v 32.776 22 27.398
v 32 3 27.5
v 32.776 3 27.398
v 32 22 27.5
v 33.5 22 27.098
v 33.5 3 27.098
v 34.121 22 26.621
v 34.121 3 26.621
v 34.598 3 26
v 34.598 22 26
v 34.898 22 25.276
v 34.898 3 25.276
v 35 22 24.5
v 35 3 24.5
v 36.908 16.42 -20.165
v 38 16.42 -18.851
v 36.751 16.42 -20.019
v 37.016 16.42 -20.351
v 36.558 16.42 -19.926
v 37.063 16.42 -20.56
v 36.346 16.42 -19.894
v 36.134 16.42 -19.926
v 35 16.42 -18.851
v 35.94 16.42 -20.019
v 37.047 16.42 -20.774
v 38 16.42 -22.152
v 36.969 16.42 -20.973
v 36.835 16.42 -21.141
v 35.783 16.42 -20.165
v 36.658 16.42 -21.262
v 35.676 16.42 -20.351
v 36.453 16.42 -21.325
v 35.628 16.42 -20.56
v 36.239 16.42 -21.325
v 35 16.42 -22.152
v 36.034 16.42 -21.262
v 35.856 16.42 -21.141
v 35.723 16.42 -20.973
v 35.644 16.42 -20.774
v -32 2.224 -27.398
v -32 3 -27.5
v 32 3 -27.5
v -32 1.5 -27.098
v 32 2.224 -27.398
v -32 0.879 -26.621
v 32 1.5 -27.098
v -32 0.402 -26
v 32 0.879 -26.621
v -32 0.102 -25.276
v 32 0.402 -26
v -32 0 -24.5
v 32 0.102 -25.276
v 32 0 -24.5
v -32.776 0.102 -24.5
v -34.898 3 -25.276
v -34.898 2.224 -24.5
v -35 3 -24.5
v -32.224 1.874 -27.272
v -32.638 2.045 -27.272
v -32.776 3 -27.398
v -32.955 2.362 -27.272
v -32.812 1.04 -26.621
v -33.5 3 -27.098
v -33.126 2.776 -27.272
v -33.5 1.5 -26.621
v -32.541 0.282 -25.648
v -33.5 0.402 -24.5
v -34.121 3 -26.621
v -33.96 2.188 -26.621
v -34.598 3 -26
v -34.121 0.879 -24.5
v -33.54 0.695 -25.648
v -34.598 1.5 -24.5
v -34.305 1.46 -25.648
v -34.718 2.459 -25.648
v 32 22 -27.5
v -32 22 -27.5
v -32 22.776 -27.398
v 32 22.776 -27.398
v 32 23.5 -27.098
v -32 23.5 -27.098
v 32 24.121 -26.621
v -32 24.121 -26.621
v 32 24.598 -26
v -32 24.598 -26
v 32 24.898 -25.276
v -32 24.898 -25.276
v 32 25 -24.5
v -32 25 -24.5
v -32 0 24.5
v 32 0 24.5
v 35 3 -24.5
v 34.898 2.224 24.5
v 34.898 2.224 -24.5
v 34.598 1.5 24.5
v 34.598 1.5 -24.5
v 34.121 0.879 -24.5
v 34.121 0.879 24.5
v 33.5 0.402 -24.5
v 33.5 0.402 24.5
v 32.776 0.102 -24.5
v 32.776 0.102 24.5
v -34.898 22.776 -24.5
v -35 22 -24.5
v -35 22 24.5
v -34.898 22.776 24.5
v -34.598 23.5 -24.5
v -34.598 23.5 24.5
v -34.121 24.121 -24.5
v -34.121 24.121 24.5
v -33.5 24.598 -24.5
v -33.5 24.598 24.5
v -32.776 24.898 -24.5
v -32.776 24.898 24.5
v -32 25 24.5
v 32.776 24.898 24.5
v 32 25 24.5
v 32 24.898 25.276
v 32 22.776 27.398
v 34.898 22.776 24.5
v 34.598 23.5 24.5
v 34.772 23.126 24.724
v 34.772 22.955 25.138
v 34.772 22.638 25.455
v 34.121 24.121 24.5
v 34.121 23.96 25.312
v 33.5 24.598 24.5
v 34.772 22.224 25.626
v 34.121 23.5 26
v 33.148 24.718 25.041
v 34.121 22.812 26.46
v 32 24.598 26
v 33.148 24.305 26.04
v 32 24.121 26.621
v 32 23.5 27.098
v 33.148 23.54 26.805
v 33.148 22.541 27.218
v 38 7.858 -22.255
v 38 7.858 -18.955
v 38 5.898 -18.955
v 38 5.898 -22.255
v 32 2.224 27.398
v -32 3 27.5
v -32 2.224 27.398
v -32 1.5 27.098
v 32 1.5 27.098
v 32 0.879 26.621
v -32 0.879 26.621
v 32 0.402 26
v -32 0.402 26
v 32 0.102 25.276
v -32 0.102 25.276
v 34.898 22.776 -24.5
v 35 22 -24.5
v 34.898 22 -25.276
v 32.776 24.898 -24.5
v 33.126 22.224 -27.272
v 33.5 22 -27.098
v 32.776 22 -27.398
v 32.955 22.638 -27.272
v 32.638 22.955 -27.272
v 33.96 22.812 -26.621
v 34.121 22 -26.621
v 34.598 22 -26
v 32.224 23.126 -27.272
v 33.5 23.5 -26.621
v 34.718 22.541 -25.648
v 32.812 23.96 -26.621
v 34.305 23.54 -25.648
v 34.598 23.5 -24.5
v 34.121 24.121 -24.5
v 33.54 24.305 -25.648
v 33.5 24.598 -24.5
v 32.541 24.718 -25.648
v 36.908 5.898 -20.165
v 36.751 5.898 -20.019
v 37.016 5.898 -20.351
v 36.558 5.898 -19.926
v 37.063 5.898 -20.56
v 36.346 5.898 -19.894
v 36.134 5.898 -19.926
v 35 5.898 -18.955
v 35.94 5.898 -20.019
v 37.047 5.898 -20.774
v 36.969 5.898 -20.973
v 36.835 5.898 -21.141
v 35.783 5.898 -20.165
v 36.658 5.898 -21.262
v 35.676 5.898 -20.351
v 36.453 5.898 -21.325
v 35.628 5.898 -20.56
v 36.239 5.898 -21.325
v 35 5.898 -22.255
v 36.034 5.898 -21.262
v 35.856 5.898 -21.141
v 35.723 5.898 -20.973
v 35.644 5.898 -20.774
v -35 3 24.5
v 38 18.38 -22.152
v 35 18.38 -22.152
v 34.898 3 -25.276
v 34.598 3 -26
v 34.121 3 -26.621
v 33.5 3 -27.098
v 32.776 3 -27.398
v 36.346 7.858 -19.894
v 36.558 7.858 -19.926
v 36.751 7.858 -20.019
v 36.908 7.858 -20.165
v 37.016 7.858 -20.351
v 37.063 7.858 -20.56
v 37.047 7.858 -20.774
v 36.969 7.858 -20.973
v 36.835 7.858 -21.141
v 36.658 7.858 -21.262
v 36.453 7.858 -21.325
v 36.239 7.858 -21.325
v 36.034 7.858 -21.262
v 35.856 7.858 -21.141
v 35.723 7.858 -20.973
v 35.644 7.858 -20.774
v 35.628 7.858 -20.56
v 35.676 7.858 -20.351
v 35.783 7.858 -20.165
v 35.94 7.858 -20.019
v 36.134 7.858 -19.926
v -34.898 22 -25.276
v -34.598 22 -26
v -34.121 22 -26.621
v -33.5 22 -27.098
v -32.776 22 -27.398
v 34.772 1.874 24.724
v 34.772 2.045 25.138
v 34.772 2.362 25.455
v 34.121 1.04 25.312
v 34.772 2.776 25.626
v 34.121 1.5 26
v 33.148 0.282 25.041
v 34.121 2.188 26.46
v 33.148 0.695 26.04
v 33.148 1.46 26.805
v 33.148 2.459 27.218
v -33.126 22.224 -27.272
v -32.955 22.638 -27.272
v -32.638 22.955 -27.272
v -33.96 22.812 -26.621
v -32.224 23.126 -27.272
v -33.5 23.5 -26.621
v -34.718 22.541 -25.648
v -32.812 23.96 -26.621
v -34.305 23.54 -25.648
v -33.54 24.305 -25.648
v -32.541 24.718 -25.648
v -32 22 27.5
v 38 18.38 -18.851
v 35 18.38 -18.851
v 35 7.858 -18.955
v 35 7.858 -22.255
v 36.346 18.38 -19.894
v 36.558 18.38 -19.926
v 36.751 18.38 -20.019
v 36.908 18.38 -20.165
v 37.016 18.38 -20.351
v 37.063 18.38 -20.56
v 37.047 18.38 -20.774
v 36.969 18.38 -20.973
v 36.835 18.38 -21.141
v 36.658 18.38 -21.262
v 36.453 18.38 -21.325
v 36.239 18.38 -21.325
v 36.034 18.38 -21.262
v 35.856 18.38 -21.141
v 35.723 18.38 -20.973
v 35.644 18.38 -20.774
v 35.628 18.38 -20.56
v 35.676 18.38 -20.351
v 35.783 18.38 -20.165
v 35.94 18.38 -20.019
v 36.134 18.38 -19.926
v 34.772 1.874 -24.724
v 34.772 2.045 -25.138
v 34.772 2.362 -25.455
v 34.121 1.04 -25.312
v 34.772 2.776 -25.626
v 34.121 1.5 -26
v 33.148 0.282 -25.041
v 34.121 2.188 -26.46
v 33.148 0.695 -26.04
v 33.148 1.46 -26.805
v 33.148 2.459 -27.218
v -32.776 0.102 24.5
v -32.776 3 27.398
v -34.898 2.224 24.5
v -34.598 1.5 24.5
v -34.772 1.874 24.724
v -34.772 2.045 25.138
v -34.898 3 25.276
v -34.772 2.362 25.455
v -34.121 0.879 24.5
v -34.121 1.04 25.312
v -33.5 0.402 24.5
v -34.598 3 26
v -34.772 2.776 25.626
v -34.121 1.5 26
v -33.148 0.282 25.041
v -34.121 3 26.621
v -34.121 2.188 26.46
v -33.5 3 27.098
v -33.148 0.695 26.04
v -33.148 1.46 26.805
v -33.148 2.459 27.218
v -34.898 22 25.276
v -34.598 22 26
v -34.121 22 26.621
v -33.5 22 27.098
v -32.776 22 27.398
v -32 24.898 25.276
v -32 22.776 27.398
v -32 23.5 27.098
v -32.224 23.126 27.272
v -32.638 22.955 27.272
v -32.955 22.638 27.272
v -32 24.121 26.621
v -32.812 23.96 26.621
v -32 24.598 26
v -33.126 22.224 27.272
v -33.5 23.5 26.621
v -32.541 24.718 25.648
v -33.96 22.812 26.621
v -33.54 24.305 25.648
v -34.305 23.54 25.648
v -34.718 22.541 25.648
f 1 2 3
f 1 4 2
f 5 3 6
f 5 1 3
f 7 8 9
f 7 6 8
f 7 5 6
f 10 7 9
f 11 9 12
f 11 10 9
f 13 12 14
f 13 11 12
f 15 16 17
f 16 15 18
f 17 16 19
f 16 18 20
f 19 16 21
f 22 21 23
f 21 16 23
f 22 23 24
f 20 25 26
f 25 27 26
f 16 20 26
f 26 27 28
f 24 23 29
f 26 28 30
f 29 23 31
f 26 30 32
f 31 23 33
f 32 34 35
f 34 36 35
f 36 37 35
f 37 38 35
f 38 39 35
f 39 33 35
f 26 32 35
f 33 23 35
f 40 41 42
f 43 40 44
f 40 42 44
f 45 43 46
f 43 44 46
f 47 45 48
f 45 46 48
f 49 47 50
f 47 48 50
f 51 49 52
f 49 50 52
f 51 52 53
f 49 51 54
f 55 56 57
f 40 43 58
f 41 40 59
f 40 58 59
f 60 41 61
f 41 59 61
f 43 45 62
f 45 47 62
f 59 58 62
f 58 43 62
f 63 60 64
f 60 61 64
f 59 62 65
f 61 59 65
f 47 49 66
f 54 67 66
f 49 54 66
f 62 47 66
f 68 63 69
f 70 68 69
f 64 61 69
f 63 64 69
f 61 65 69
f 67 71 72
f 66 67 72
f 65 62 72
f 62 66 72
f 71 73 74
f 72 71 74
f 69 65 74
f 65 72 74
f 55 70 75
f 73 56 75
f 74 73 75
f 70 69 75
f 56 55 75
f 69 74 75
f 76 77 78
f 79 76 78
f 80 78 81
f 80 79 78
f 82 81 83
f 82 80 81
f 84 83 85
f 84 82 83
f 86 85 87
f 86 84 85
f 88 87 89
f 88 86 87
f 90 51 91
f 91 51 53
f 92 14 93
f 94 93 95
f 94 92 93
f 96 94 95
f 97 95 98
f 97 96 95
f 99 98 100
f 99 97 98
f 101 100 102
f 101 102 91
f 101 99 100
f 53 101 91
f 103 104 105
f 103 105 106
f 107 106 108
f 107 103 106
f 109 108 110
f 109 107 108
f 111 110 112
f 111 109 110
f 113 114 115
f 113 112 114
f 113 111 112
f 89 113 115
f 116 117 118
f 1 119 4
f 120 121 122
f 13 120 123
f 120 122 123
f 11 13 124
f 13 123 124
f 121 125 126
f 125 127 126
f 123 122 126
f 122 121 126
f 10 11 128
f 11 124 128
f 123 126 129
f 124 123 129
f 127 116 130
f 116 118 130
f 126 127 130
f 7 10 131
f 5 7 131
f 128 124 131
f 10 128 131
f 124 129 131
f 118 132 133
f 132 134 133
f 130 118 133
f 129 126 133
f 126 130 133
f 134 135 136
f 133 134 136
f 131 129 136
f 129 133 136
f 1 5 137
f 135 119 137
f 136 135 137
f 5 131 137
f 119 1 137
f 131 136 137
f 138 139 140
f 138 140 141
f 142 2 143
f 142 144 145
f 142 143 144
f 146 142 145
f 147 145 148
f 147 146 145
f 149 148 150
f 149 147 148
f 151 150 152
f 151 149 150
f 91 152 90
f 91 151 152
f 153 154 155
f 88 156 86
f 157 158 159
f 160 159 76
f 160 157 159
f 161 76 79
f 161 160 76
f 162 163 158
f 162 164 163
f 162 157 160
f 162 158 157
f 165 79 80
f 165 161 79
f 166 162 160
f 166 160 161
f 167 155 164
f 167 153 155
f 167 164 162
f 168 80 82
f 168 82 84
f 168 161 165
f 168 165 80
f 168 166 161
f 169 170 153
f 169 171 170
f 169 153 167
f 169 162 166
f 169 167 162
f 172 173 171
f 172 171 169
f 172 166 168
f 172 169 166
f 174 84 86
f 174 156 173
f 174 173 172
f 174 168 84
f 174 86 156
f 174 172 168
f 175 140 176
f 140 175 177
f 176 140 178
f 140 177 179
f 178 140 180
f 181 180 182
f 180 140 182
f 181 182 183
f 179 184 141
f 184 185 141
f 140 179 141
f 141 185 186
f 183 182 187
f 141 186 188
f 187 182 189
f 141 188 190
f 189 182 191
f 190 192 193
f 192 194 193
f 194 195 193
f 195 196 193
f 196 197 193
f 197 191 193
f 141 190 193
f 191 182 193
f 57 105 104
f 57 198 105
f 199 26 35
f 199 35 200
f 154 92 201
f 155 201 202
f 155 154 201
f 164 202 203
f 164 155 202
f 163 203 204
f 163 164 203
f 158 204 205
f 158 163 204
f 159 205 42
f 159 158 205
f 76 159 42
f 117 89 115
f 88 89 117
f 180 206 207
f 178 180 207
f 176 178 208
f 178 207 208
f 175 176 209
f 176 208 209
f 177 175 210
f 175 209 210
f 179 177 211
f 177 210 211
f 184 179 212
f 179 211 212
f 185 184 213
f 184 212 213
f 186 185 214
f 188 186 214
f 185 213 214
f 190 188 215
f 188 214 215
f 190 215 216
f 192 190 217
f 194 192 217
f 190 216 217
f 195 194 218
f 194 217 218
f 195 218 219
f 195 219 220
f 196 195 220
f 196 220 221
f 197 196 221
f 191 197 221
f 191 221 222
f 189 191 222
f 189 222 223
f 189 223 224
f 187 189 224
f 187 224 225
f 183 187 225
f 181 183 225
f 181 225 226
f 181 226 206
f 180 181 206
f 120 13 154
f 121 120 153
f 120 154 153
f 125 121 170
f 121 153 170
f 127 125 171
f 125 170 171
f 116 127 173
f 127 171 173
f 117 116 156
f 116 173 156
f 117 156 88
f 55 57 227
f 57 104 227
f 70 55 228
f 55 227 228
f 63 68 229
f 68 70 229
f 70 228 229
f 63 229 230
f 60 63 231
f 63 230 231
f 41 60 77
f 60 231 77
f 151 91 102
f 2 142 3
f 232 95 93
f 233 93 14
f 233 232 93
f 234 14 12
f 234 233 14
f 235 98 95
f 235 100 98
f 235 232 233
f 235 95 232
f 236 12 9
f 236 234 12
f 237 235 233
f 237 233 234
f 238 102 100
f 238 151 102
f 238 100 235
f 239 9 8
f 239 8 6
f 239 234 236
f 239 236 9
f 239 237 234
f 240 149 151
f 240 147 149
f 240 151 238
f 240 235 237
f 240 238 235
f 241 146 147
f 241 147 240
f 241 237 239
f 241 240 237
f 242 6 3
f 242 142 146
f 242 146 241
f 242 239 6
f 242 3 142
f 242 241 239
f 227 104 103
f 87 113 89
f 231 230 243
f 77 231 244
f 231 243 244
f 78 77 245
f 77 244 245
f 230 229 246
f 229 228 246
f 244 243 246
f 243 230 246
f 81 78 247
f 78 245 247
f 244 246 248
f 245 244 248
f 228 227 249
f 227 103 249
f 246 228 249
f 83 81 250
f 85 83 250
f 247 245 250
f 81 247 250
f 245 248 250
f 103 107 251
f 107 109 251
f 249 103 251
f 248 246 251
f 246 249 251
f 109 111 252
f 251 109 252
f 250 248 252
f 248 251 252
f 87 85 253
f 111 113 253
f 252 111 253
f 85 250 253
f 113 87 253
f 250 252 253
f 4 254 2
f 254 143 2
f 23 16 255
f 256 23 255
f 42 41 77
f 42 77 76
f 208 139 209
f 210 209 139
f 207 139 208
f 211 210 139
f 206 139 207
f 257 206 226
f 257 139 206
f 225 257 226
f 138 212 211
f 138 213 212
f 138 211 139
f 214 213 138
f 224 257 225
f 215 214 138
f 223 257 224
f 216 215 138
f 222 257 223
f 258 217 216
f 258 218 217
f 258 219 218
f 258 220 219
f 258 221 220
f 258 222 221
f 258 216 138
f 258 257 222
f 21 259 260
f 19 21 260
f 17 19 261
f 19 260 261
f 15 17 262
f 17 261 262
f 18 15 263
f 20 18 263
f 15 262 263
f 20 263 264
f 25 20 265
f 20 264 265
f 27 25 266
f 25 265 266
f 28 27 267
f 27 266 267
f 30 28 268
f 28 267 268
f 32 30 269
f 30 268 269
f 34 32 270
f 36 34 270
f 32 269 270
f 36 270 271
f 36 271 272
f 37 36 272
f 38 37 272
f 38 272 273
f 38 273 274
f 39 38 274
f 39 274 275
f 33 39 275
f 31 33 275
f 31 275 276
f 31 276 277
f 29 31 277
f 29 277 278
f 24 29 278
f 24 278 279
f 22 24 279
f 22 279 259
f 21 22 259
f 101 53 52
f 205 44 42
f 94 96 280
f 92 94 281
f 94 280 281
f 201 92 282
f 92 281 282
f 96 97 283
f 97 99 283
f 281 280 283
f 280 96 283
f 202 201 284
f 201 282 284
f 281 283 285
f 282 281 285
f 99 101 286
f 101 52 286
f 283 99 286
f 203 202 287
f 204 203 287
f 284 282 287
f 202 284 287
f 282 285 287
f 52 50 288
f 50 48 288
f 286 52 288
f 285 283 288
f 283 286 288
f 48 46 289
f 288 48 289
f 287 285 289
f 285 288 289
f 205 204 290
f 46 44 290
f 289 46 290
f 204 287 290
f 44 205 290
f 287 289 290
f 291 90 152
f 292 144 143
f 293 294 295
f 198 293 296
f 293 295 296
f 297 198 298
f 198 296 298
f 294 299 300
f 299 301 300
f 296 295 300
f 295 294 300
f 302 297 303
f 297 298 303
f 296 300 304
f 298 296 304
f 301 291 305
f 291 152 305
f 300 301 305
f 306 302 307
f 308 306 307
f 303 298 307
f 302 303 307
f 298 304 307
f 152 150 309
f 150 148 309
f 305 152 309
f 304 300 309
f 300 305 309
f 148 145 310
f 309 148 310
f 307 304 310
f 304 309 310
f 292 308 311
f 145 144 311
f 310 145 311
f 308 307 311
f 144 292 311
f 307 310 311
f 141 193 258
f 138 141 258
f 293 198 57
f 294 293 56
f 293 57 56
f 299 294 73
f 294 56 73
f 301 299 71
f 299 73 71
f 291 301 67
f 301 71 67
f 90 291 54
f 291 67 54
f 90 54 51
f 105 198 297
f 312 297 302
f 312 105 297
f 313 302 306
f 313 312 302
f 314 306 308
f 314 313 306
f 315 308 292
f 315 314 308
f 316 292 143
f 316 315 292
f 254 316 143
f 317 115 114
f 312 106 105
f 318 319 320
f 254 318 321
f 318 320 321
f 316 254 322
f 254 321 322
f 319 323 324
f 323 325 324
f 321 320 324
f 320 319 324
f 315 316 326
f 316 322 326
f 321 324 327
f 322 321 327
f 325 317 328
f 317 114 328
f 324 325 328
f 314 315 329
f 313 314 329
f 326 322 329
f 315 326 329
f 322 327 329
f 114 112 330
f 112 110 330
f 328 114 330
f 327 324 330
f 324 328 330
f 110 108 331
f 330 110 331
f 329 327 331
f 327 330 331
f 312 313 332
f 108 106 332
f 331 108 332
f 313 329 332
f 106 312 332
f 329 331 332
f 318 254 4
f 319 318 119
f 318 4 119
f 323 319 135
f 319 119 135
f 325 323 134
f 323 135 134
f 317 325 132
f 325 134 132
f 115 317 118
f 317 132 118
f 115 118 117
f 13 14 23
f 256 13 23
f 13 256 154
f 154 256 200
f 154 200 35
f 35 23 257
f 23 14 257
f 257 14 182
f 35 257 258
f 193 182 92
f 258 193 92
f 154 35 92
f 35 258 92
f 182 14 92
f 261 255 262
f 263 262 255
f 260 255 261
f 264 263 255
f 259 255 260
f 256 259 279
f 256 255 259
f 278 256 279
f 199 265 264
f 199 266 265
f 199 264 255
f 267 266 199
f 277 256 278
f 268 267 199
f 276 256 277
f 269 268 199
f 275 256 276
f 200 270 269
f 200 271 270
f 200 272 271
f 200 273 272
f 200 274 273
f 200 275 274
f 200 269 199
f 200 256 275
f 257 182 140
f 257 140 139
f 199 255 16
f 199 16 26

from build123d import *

# Parameters (mm, degrees)
SKETCH1_W           = 70
SKETCH1_H           = 55
BOSS_EXTRUDE1_DEPTH = 25
FILLET1_R           = 3
SKETCH2_W           = 3.300925217
SKETCH2_H           = 1.959924347
BOSS_EXTRUDE2_DEPTH = 3
SKETCH3_R           = 0.719628756
CUT_EXTRUDE1_DEPTH  = 22


with BuildPart() as part:
    # Sketch1 → Boss-Extrude1 (new body)
    with BuildSketch(Plane(origin=(0, 0, 0), x_dir=(1, 0, 0), z_dir=(0, 1, 0))):
        Rectangle(SKETCH1_W, SKETCH1_H)
    extrude(amount=BOSS_EXTRUDE1_DEPTH)

    # Fillet1
    fillet1_edges = [part.edges().sort_by_distance(p)[0] for p in [
        (-35, 25, 0),
        (0, 25, 27.5),
        (35, 25, 0),
        (0, 0, 27.5),
        (-35, 0, 0),
        (0, 0, -27.5),
        (35, 0, 0),
        (35, 12.5, 27.5),
        (-35, 12.5, 27.5),
        (-35, 12.5, -27.5),
        (35, 12.5, -27.5),
        (0, 25, -27.5),
    ]]
    fillet(fillet1_edges, radius=FILLET1_R)

    # Sketch2 → Boss-Extrude2 (add)
    with BuildSketch(Plane(origin=(35, 0, 0), x_dir=(0, 0, -1), z_dir=(1, 0, 0))):
        with Locations((20.501840212, 17.399810869)):
            Rectangle(SKETCH2_W, SKETCH2_H)
        with Locations((20.604994125, 6.87811174)):
            Rectangle(SKETCH2_W, SKETCH2_H)
    extrude(amount=BOSS_EXTRUDE2_DEPTH)

    # Sketch3 → Cut-Extrude1 (cut)
    with BuildSketch(Plane(origin=(0, 18.379773042, 0), x_dir=(1, 0, 0), z_dir=(0, 1, 0))):
        with Locations(Location((36.345846873, 20.613426823, 0), (0, 0, 270))):
            Circle(SKETCH3_R)
    extrude(amount=-CUT_EXTRUDE1_DEPTH, mode=Mode.SUBTRACT)


solid = part.part
